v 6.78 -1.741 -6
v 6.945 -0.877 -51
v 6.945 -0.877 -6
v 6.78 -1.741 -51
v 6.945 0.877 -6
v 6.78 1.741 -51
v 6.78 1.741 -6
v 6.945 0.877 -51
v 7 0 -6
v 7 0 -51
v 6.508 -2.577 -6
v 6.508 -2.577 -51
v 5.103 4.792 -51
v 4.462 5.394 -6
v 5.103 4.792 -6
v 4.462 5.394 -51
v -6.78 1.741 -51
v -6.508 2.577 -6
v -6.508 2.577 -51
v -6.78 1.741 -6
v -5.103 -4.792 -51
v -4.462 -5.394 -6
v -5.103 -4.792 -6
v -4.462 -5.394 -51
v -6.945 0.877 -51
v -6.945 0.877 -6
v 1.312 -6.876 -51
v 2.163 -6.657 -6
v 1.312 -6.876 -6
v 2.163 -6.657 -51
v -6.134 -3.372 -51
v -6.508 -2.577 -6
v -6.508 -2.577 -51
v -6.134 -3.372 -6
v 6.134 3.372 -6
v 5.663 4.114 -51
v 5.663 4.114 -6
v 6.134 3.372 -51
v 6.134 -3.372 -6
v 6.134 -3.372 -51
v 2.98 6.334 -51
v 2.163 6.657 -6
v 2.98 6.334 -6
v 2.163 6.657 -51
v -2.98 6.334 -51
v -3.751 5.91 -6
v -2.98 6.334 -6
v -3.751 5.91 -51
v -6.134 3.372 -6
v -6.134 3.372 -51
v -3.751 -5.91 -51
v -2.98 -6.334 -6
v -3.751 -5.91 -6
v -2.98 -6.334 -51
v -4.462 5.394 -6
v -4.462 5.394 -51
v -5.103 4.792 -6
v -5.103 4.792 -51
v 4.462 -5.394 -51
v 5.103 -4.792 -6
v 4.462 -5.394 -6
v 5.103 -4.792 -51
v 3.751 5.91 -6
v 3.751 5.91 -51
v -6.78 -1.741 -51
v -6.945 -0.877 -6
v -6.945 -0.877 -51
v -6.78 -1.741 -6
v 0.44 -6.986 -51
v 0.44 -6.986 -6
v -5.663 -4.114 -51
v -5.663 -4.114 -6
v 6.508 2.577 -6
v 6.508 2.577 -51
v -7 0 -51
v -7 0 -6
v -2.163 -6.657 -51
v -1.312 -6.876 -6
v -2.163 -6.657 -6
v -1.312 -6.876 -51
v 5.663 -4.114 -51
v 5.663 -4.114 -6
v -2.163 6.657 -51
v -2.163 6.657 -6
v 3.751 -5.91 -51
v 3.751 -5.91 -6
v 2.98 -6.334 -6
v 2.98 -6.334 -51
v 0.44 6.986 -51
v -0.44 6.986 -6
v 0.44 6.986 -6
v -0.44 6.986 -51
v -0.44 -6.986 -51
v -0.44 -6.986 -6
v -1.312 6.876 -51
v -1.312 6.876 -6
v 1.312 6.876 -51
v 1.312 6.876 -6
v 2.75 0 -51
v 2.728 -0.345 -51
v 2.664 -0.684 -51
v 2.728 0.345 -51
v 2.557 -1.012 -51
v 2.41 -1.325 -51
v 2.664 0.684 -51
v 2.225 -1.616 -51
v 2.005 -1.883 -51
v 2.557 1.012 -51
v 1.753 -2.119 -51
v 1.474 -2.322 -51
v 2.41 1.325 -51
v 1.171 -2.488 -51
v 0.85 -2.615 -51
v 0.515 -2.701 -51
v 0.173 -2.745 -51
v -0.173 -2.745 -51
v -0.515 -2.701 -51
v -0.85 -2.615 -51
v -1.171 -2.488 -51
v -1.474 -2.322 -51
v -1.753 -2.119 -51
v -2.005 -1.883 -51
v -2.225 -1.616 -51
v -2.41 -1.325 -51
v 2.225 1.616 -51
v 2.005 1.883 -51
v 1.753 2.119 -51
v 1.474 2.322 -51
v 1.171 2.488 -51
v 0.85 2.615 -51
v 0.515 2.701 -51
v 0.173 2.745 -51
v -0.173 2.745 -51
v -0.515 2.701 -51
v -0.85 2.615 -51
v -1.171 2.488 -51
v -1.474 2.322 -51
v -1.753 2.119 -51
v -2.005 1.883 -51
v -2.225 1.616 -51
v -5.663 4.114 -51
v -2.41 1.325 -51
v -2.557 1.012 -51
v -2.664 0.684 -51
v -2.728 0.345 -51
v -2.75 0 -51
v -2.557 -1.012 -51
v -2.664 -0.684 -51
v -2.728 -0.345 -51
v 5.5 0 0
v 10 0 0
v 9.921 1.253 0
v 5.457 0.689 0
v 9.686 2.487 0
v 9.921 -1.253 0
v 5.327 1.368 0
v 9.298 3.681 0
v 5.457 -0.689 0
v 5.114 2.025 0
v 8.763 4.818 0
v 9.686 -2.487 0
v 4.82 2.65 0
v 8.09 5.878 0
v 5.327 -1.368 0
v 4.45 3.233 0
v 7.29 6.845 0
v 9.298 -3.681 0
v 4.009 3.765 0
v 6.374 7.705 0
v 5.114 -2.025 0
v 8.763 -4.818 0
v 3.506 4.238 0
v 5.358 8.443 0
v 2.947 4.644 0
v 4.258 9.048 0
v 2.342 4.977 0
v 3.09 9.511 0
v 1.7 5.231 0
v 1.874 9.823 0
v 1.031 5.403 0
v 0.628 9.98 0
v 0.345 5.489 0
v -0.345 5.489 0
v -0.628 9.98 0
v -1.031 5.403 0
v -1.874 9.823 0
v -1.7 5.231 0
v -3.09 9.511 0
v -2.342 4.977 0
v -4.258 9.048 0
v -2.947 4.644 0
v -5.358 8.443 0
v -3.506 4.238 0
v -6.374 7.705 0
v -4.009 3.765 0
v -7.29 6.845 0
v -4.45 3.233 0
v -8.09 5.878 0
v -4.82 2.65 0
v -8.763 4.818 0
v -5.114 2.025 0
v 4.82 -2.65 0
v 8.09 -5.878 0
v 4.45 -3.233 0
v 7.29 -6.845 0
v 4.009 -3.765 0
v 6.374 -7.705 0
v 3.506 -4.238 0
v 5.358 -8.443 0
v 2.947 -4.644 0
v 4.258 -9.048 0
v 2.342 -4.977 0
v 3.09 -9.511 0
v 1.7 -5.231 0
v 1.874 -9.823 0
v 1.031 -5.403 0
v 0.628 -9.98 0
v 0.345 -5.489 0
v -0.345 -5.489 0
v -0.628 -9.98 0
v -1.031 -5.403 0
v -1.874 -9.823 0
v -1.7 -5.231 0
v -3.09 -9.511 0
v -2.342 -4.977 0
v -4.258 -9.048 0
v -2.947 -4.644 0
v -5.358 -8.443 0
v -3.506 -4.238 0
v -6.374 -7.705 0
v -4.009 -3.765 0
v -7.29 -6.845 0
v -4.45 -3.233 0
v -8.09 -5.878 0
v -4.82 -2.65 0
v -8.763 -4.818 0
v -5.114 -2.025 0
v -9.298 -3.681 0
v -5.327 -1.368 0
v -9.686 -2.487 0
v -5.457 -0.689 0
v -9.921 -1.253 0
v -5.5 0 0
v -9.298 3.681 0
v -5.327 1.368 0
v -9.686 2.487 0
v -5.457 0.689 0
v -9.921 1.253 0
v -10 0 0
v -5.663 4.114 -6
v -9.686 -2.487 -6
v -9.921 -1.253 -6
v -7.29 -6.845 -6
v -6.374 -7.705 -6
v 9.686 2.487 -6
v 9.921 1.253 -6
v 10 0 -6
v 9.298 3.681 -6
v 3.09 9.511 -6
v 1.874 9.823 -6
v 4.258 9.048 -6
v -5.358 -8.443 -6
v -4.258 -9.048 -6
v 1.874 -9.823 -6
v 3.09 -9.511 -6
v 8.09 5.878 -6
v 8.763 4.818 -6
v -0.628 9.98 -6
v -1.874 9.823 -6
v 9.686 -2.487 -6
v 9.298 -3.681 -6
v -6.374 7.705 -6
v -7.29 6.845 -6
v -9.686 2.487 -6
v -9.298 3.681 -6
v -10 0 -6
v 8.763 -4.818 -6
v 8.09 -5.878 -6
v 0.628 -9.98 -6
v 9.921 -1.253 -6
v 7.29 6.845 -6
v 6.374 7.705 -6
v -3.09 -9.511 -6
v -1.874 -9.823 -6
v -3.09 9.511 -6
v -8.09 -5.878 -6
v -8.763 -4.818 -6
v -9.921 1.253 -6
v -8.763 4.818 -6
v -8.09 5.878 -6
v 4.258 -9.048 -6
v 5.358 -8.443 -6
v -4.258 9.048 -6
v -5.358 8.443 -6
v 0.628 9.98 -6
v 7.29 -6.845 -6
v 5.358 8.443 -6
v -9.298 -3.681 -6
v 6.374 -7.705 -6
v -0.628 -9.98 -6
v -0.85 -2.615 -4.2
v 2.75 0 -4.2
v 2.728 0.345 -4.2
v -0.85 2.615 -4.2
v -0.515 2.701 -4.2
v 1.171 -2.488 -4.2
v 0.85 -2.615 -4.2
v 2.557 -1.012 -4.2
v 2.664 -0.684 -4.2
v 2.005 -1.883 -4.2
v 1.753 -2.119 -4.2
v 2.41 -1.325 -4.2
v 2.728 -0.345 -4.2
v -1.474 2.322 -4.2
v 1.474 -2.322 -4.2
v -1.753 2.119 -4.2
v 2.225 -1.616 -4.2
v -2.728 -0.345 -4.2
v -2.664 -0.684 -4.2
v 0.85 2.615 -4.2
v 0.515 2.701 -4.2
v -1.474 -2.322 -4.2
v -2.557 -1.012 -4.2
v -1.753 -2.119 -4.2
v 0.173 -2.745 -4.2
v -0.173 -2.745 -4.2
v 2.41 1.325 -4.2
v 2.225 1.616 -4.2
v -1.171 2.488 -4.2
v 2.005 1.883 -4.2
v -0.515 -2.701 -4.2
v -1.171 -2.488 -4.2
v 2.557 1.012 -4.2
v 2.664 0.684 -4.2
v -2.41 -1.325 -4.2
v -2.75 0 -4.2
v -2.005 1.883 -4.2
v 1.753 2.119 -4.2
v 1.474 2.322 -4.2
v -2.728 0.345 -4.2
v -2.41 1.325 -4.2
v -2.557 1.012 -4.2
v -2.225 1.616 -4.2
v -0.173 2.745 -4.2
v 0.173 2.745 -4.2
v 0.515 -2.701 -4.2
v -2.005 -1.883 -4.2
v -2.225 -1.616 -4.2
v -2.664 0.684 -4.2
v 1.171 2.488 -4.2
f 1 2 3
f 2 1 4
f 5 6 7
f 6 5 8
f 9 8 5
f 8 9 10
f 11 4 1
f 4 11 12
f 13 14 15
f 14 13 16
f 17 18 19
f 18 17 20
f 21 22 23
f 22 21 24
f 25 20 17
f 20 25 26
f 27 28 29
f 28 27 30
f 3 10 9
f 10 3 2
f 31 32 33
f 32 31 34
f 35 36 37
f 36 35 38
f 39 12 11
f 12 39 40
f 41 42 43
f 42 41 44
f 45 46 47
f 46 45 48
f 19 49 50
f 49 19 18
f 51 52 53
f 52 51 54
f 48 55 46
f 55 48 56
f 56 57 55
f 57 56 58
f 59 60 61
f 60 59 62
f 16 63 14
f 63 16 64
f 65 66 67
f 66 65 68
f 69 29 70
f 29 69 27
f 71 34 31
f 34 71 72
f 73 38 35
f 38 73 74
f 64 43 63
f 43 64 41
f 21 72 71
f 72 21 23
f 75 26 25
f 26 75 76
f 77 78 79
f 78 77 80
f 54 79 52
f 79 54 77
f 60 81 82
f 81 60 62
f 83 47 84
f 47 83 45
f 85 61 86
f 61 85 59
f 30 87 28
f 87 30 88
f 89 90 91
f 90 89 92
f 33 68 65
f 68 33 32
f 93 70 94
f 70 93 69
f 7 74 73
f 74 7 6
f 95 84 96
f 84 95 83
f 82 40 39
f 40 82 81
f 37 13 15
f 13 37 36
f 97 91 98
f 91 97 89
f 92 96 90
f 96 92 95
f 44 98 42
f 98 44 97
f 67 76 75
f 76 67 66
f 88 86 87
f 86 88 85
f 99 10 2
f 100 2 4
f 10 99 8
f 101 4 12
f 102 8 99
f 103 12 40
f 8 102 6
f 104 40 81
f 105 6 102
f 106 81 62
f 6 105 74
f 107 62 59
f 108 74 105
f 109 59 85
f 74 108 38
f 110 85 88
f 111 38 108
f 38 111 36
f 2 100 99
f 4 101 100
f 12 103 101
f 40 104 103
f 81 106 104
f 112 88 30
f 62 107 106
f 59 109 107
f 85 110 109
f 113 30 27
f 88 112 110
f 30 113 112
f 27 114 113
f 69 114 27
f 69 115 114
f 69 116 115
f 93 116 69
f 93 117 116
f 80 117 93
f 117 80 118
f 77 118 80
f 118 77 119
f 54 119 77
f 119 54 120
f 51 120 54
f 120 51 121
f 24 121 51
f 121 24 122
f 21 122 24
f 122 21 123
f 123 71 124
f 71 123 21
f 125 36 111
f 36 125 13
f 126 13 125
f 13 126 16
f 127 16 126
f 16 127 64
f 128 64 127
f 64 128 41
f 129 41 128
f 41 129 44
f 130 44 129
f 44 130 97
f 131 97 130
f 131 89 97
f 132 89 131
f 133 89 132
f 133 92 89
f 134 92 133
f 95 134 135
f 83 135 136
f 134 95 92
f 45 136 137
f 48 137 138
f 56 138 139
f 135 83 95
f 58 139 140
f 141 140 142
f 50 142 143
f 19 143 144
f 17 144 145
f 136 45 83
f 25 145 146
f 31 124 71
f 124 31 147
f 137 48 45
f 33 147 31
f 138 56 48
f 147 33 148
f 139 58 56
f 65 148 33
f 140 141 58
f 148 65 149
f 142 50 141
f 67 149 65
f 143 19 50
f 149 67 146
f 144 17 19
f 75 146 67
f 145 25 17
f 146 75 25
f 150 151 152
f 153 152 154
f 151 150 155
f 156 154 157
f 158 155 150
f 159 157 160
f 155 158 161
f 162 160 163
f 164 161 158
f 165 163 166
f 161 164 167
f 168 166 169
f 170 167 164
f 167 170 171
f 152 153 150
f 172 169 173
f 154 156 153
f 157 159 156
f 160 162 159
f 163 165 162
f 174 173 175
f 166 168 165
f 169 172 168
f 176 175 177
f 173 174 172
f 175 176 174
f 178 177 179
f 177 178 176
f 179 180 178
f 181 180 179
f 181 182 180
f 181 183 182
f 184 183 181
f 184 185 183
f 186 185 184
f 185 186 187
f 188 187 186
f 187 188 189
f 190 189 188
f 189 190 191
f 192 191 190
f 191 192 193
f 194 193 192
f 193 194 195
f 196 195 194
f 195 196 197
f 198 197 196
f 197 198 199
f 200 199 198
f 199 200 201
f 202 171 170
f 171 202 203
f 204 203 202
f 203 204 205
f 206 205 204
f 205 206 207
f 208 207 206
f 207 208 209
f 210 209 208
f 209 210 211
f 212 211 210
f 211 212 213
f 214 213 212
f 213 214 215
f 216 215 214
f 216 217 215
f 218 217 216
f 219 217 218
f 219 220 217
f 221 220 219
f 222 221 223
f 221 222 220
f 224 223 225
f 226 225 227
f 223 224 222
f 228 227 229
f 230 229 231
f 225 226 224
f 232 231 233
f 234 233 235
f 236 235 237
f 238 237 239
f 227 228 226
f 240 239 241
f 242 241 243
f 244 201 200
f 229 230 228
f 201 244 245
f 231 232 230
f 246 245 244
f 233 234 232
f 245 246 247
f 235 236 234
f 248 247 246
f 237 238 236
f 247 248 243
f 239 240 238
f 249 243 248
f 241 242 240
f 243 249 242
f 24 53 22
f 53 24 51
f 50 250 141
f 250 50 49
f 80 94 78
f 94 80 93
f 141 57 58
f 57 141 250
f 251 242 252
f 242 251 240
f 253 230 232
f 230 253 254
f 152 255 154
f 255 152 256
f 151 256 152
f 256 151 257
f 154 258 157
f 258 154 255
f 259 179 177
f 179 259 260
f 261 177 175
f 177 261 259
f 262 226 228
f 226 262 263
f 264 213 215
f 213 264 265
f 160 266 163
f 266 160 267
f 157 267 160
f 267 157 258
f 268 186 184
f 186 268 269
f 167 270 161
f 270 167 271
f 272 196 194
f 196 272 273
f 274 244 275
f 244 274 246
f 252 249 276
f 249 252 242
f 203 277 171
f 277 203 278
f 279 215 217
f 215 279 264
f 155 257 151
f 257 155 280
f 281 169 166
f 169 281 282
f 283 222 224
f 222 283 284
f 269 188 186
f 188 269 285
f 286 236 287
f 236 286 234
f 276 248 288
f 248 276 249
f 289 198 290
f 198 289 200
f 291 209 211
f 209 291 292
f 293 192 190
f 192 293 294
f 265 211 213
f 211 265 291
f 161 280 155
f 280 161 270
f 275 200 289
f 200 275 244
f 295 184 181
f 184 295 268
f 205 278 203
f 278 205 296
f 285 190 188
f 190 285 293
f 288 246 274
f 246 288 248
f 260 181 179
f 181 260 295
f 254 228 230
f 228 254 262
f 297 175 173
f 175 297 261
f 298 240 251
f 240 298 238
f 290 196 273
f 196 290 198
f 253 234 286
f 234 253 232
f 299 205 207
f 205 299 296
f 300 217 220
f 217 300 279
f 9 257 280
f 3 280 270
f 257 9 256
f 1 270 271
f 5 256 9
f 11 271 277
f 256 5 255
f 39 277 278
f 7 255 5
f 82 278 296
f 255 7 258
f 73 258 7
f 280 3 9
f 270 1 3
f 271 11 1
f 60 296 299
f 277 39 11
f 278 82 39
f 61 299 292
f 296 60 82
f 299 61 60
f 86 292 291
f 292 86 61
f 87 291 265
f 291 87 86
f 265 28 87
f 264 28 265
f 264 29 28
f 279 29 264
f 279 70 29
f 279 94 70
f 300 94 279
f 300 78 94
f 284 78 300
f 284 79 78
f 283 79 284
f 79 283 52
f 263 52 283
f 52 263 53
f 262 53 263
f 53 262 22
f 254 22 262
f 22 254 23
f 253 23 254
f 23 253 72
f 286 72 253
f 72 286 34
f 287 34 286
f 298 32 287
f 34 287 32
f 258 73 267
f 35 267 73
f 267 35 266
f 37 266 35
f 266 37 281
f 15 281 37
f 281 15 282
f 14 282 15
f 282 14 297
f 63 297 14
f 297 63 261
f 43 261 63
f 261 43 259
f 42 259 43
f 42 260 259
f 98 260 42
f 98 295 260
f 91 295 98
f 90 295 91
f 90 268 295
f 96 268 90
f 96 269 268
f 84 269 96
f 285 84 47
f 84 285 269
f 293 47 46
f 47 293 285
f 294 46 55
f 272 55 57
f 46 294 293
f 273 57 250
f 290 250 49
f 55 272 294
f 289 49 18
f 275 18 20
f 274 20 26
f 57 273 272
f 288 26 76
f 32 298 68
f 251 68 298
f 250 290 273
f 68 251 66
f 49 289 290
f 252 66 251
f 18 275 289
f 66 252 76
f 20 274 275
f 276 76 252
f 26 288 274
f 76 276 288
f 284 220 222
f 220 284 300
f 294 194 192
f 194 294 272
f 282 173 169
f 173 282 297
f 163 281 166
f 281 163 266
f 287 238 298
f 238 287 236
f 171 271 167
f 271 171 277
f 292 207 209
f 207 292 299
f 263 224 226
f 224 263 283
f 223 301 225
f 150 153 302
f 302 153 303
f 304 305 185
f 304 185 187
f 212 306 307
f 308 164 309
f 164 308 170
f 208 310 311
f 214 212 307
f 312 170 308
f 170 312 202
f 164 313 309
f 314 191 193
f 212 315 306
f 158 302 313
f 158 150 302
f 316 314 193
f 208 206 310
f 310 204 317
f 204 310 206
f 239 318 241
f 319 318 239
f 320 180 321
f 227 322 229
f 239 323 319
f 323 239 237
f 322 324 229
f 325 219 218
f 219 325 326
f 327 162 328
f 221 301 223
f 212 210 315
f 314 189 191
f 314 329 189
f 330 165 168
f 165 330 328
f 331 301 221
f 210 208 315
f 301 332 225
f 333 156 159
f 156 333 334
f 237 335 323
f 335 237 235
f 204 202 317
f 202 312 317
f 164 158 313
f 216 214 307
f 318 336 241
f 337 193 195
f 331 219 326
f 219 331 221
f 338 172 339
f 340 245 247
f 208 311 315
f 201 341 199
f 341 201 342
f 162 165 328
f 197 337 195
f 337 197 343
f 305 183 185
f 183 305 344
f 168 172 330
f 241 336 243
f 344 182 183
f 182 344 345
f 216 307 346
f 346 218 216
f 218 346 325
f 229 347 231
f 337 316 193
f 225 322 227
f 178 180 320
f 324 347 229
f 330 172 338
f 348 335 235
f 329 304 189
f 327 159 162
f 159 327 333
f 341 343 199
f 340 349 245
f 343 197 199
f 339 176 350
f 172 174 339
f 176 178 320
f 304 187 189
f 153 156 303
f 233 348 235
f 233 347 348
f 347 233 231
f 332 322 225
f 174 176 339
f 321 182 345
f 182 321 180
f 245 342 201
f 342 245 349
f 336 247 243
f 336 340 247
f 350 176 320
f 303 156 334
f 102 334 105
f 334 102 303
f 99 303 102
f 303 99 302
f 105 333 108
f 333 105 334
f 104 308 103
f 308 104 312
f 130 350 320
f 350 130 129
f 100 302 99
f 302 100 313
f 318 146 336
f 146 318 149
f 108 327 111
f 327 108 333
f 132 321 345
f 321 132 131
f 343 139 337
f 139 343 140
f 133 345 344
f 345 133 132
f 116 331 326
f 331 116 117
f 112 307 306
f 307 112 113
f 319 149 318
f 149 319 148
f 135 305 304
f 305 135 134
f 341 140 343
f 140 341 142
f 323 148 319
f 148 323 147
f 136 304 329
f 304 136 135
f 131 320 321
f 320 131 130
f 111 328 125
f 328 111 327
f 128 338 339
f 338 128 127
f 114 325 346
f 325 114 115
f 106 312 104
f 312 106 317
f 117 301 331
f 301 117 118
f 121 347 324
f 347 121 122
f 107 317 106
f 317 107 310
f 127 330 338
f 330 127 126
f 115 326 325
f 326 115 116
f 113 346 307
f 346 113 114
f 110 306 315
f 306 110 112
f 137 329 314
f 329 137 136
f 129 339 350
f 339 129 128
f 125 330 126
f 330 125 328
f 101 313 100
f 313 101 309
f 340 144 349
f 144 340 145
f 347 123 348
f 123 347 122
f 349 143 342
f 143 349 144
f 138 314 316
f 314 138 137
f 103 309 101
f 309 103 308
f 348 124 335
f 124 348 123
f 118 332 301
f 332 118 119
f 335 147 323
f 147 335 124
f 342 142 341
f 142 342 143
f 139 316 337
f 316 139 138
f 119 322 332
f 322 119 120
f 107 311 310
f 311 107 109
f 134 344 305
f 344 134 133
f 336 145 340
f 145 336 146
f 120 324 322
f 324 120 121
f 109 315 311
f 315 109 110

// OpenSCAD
$fn = 50;


difference() {
	union() {
		translate(v = [0, 0, -51.0000000000]) {
			cylinder(h = 51, r = 7.0000000000);
		}
		translate(v = [0, 0, -6.0000000000]) {
			cylinder(h = 6, r = 10.0000000000);
		}
	}
	union() {
		translate(v = [0, 0, 0]) {
			rotate(a = [0, 0, 0]) {
				difference() {
					union() {
						#translate(v = [0, 0, -51.0000000000]) {
							cylinder(h = 51, r = 2.2500000000);
						}
						#translate(v = [0, 0, -4.2000000000]) {
							cylinder(h = 4.2000000000, r1 = 2.7500000000, r2 = 5.5000000000);
						}
						#translate(v = [0, 0, -51.0000000000]) {
							cylinder(h = 51, r = 2.7500000000);
						}
						#translate(v = [0, 0, -51.0000000000]) {
							cylinder(h = 51, r = 2.2500000000);
						}
					}
					union();
				}
			}
		}
	}
}
